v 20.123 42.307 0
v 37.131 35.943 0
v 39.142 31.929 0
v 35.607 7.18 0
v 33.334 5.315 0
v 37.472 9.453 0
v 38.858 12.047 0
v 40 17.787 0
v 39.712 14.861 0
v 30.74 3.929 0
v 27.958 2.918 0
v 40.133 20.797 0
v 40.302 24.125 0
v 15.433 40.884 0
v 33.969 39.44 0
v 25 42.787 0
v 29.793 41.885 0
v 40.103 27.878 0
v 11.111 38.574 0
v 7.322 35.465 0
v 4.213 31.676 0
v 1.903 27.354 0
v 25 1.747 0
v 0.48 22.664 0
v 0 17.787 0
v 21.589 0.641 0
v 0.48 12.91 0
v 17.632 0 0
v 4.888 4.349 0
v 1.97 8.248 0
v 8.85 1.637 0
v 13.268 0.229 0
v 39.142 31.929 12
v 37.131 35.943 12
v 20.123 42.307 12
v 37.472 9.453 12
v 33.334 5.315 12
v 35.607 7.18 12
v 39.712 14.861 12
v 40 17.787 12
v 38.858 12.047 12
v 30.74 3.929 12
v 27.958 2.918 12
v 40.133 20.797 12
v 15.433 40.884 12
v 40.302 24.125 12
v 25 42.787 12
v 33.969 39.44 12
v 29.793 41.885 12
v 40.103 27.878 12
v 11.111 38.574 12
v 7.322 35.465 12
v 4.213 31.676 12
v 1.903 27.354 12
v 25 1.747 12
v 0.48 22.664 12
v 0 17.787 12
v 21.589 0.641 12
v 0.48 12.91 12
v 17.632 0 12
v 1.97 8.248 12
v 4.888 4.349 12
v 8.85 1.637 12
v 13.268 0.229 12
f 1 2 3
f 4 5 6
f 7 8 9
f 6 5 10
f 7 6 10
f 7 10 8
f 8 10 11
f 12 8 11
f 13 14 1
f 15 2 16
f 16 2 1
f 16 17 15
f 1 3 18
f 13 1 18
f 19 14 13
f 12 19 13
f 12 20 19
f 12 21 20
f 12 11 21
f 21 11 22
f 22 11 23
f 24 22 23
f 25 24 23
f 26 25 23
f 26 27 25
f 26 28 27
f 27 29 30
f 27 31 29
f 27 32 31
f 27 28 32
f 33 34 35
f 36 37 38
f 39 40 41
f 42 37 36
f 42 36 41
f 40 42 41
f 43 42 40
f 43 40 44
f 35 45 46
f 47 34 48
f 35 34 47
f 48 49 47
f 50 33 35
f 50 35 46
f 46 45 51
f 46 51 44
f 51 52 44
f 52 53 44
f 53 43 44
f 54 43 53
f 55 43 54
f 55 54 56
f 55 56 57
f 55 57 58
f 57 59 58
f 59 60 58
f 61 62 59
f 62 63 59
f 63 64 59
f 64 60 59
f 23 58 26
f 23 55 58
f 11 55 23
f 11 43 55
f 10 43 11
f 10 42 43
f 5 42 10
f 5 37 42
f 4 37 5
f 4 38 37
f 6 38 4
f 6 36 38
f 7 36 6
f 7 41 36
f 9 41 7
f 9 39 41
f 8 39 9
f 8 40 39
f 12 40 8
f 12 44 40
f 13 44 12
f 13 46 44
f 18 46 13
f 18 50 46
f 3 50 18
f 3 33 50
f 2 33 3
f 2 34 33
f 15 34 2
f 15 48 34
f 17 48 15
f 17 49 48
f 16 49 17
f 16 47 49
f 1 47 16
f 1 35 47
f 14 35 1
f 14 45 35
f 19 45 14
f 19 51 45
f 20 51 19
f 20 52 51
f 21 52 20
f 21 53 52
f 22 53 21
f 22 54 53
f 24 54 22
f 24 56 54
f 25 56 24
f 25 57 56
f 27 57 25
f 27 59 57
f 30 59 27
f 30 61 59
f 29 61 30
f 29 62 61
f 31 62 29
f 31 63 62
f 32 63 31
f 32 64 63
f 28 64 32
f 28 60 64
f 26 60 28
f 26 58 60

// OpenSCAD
$fn = 32;

// ----------------------------------------------------------------------
// Cam disc: base radius 15.0 mm, lift 10.0 mm, 32 profile points
// ----------------------------------------------------------------------

// --- parameters (mm) ---
profile_height = 12;      // extrusion height
profile_points = 32;      // points of the closed outline

profile = [[40, 17.787], [40.133, 20.797], [40.302, 24.125], [40.103, 27.878], [39.142, 31.929], [37.131, 35.943], [33.969, 39.44], [29.793, 41.885], [25, 42.787], [20.123, 42.307], [15.433, 40.884], [11.111, 38.574], [7.322, 35.465], [4.213, 31.676], [1.903, 27.354], [0.48, 22.664], [0, 17.787], [0.48, 12.91], [1.97, 8.248], [4.888, 4.349], [8.85, 1.637], [13.268, 0.229], [17.632, 0], [21.589, 0.641], [25, 1.747], [27.958, 2.918], [30.74, 3.929], [33.334, 5.315], [35.607, 7.18], [37.472, 9.453], [38.858, 12.047], [39.712, 14.861]];  // single closed polygon, 32 points, counter clockwise

// --- the one profile operation ---
linear_extrude(height = profile_height) polygon(points = profile);
